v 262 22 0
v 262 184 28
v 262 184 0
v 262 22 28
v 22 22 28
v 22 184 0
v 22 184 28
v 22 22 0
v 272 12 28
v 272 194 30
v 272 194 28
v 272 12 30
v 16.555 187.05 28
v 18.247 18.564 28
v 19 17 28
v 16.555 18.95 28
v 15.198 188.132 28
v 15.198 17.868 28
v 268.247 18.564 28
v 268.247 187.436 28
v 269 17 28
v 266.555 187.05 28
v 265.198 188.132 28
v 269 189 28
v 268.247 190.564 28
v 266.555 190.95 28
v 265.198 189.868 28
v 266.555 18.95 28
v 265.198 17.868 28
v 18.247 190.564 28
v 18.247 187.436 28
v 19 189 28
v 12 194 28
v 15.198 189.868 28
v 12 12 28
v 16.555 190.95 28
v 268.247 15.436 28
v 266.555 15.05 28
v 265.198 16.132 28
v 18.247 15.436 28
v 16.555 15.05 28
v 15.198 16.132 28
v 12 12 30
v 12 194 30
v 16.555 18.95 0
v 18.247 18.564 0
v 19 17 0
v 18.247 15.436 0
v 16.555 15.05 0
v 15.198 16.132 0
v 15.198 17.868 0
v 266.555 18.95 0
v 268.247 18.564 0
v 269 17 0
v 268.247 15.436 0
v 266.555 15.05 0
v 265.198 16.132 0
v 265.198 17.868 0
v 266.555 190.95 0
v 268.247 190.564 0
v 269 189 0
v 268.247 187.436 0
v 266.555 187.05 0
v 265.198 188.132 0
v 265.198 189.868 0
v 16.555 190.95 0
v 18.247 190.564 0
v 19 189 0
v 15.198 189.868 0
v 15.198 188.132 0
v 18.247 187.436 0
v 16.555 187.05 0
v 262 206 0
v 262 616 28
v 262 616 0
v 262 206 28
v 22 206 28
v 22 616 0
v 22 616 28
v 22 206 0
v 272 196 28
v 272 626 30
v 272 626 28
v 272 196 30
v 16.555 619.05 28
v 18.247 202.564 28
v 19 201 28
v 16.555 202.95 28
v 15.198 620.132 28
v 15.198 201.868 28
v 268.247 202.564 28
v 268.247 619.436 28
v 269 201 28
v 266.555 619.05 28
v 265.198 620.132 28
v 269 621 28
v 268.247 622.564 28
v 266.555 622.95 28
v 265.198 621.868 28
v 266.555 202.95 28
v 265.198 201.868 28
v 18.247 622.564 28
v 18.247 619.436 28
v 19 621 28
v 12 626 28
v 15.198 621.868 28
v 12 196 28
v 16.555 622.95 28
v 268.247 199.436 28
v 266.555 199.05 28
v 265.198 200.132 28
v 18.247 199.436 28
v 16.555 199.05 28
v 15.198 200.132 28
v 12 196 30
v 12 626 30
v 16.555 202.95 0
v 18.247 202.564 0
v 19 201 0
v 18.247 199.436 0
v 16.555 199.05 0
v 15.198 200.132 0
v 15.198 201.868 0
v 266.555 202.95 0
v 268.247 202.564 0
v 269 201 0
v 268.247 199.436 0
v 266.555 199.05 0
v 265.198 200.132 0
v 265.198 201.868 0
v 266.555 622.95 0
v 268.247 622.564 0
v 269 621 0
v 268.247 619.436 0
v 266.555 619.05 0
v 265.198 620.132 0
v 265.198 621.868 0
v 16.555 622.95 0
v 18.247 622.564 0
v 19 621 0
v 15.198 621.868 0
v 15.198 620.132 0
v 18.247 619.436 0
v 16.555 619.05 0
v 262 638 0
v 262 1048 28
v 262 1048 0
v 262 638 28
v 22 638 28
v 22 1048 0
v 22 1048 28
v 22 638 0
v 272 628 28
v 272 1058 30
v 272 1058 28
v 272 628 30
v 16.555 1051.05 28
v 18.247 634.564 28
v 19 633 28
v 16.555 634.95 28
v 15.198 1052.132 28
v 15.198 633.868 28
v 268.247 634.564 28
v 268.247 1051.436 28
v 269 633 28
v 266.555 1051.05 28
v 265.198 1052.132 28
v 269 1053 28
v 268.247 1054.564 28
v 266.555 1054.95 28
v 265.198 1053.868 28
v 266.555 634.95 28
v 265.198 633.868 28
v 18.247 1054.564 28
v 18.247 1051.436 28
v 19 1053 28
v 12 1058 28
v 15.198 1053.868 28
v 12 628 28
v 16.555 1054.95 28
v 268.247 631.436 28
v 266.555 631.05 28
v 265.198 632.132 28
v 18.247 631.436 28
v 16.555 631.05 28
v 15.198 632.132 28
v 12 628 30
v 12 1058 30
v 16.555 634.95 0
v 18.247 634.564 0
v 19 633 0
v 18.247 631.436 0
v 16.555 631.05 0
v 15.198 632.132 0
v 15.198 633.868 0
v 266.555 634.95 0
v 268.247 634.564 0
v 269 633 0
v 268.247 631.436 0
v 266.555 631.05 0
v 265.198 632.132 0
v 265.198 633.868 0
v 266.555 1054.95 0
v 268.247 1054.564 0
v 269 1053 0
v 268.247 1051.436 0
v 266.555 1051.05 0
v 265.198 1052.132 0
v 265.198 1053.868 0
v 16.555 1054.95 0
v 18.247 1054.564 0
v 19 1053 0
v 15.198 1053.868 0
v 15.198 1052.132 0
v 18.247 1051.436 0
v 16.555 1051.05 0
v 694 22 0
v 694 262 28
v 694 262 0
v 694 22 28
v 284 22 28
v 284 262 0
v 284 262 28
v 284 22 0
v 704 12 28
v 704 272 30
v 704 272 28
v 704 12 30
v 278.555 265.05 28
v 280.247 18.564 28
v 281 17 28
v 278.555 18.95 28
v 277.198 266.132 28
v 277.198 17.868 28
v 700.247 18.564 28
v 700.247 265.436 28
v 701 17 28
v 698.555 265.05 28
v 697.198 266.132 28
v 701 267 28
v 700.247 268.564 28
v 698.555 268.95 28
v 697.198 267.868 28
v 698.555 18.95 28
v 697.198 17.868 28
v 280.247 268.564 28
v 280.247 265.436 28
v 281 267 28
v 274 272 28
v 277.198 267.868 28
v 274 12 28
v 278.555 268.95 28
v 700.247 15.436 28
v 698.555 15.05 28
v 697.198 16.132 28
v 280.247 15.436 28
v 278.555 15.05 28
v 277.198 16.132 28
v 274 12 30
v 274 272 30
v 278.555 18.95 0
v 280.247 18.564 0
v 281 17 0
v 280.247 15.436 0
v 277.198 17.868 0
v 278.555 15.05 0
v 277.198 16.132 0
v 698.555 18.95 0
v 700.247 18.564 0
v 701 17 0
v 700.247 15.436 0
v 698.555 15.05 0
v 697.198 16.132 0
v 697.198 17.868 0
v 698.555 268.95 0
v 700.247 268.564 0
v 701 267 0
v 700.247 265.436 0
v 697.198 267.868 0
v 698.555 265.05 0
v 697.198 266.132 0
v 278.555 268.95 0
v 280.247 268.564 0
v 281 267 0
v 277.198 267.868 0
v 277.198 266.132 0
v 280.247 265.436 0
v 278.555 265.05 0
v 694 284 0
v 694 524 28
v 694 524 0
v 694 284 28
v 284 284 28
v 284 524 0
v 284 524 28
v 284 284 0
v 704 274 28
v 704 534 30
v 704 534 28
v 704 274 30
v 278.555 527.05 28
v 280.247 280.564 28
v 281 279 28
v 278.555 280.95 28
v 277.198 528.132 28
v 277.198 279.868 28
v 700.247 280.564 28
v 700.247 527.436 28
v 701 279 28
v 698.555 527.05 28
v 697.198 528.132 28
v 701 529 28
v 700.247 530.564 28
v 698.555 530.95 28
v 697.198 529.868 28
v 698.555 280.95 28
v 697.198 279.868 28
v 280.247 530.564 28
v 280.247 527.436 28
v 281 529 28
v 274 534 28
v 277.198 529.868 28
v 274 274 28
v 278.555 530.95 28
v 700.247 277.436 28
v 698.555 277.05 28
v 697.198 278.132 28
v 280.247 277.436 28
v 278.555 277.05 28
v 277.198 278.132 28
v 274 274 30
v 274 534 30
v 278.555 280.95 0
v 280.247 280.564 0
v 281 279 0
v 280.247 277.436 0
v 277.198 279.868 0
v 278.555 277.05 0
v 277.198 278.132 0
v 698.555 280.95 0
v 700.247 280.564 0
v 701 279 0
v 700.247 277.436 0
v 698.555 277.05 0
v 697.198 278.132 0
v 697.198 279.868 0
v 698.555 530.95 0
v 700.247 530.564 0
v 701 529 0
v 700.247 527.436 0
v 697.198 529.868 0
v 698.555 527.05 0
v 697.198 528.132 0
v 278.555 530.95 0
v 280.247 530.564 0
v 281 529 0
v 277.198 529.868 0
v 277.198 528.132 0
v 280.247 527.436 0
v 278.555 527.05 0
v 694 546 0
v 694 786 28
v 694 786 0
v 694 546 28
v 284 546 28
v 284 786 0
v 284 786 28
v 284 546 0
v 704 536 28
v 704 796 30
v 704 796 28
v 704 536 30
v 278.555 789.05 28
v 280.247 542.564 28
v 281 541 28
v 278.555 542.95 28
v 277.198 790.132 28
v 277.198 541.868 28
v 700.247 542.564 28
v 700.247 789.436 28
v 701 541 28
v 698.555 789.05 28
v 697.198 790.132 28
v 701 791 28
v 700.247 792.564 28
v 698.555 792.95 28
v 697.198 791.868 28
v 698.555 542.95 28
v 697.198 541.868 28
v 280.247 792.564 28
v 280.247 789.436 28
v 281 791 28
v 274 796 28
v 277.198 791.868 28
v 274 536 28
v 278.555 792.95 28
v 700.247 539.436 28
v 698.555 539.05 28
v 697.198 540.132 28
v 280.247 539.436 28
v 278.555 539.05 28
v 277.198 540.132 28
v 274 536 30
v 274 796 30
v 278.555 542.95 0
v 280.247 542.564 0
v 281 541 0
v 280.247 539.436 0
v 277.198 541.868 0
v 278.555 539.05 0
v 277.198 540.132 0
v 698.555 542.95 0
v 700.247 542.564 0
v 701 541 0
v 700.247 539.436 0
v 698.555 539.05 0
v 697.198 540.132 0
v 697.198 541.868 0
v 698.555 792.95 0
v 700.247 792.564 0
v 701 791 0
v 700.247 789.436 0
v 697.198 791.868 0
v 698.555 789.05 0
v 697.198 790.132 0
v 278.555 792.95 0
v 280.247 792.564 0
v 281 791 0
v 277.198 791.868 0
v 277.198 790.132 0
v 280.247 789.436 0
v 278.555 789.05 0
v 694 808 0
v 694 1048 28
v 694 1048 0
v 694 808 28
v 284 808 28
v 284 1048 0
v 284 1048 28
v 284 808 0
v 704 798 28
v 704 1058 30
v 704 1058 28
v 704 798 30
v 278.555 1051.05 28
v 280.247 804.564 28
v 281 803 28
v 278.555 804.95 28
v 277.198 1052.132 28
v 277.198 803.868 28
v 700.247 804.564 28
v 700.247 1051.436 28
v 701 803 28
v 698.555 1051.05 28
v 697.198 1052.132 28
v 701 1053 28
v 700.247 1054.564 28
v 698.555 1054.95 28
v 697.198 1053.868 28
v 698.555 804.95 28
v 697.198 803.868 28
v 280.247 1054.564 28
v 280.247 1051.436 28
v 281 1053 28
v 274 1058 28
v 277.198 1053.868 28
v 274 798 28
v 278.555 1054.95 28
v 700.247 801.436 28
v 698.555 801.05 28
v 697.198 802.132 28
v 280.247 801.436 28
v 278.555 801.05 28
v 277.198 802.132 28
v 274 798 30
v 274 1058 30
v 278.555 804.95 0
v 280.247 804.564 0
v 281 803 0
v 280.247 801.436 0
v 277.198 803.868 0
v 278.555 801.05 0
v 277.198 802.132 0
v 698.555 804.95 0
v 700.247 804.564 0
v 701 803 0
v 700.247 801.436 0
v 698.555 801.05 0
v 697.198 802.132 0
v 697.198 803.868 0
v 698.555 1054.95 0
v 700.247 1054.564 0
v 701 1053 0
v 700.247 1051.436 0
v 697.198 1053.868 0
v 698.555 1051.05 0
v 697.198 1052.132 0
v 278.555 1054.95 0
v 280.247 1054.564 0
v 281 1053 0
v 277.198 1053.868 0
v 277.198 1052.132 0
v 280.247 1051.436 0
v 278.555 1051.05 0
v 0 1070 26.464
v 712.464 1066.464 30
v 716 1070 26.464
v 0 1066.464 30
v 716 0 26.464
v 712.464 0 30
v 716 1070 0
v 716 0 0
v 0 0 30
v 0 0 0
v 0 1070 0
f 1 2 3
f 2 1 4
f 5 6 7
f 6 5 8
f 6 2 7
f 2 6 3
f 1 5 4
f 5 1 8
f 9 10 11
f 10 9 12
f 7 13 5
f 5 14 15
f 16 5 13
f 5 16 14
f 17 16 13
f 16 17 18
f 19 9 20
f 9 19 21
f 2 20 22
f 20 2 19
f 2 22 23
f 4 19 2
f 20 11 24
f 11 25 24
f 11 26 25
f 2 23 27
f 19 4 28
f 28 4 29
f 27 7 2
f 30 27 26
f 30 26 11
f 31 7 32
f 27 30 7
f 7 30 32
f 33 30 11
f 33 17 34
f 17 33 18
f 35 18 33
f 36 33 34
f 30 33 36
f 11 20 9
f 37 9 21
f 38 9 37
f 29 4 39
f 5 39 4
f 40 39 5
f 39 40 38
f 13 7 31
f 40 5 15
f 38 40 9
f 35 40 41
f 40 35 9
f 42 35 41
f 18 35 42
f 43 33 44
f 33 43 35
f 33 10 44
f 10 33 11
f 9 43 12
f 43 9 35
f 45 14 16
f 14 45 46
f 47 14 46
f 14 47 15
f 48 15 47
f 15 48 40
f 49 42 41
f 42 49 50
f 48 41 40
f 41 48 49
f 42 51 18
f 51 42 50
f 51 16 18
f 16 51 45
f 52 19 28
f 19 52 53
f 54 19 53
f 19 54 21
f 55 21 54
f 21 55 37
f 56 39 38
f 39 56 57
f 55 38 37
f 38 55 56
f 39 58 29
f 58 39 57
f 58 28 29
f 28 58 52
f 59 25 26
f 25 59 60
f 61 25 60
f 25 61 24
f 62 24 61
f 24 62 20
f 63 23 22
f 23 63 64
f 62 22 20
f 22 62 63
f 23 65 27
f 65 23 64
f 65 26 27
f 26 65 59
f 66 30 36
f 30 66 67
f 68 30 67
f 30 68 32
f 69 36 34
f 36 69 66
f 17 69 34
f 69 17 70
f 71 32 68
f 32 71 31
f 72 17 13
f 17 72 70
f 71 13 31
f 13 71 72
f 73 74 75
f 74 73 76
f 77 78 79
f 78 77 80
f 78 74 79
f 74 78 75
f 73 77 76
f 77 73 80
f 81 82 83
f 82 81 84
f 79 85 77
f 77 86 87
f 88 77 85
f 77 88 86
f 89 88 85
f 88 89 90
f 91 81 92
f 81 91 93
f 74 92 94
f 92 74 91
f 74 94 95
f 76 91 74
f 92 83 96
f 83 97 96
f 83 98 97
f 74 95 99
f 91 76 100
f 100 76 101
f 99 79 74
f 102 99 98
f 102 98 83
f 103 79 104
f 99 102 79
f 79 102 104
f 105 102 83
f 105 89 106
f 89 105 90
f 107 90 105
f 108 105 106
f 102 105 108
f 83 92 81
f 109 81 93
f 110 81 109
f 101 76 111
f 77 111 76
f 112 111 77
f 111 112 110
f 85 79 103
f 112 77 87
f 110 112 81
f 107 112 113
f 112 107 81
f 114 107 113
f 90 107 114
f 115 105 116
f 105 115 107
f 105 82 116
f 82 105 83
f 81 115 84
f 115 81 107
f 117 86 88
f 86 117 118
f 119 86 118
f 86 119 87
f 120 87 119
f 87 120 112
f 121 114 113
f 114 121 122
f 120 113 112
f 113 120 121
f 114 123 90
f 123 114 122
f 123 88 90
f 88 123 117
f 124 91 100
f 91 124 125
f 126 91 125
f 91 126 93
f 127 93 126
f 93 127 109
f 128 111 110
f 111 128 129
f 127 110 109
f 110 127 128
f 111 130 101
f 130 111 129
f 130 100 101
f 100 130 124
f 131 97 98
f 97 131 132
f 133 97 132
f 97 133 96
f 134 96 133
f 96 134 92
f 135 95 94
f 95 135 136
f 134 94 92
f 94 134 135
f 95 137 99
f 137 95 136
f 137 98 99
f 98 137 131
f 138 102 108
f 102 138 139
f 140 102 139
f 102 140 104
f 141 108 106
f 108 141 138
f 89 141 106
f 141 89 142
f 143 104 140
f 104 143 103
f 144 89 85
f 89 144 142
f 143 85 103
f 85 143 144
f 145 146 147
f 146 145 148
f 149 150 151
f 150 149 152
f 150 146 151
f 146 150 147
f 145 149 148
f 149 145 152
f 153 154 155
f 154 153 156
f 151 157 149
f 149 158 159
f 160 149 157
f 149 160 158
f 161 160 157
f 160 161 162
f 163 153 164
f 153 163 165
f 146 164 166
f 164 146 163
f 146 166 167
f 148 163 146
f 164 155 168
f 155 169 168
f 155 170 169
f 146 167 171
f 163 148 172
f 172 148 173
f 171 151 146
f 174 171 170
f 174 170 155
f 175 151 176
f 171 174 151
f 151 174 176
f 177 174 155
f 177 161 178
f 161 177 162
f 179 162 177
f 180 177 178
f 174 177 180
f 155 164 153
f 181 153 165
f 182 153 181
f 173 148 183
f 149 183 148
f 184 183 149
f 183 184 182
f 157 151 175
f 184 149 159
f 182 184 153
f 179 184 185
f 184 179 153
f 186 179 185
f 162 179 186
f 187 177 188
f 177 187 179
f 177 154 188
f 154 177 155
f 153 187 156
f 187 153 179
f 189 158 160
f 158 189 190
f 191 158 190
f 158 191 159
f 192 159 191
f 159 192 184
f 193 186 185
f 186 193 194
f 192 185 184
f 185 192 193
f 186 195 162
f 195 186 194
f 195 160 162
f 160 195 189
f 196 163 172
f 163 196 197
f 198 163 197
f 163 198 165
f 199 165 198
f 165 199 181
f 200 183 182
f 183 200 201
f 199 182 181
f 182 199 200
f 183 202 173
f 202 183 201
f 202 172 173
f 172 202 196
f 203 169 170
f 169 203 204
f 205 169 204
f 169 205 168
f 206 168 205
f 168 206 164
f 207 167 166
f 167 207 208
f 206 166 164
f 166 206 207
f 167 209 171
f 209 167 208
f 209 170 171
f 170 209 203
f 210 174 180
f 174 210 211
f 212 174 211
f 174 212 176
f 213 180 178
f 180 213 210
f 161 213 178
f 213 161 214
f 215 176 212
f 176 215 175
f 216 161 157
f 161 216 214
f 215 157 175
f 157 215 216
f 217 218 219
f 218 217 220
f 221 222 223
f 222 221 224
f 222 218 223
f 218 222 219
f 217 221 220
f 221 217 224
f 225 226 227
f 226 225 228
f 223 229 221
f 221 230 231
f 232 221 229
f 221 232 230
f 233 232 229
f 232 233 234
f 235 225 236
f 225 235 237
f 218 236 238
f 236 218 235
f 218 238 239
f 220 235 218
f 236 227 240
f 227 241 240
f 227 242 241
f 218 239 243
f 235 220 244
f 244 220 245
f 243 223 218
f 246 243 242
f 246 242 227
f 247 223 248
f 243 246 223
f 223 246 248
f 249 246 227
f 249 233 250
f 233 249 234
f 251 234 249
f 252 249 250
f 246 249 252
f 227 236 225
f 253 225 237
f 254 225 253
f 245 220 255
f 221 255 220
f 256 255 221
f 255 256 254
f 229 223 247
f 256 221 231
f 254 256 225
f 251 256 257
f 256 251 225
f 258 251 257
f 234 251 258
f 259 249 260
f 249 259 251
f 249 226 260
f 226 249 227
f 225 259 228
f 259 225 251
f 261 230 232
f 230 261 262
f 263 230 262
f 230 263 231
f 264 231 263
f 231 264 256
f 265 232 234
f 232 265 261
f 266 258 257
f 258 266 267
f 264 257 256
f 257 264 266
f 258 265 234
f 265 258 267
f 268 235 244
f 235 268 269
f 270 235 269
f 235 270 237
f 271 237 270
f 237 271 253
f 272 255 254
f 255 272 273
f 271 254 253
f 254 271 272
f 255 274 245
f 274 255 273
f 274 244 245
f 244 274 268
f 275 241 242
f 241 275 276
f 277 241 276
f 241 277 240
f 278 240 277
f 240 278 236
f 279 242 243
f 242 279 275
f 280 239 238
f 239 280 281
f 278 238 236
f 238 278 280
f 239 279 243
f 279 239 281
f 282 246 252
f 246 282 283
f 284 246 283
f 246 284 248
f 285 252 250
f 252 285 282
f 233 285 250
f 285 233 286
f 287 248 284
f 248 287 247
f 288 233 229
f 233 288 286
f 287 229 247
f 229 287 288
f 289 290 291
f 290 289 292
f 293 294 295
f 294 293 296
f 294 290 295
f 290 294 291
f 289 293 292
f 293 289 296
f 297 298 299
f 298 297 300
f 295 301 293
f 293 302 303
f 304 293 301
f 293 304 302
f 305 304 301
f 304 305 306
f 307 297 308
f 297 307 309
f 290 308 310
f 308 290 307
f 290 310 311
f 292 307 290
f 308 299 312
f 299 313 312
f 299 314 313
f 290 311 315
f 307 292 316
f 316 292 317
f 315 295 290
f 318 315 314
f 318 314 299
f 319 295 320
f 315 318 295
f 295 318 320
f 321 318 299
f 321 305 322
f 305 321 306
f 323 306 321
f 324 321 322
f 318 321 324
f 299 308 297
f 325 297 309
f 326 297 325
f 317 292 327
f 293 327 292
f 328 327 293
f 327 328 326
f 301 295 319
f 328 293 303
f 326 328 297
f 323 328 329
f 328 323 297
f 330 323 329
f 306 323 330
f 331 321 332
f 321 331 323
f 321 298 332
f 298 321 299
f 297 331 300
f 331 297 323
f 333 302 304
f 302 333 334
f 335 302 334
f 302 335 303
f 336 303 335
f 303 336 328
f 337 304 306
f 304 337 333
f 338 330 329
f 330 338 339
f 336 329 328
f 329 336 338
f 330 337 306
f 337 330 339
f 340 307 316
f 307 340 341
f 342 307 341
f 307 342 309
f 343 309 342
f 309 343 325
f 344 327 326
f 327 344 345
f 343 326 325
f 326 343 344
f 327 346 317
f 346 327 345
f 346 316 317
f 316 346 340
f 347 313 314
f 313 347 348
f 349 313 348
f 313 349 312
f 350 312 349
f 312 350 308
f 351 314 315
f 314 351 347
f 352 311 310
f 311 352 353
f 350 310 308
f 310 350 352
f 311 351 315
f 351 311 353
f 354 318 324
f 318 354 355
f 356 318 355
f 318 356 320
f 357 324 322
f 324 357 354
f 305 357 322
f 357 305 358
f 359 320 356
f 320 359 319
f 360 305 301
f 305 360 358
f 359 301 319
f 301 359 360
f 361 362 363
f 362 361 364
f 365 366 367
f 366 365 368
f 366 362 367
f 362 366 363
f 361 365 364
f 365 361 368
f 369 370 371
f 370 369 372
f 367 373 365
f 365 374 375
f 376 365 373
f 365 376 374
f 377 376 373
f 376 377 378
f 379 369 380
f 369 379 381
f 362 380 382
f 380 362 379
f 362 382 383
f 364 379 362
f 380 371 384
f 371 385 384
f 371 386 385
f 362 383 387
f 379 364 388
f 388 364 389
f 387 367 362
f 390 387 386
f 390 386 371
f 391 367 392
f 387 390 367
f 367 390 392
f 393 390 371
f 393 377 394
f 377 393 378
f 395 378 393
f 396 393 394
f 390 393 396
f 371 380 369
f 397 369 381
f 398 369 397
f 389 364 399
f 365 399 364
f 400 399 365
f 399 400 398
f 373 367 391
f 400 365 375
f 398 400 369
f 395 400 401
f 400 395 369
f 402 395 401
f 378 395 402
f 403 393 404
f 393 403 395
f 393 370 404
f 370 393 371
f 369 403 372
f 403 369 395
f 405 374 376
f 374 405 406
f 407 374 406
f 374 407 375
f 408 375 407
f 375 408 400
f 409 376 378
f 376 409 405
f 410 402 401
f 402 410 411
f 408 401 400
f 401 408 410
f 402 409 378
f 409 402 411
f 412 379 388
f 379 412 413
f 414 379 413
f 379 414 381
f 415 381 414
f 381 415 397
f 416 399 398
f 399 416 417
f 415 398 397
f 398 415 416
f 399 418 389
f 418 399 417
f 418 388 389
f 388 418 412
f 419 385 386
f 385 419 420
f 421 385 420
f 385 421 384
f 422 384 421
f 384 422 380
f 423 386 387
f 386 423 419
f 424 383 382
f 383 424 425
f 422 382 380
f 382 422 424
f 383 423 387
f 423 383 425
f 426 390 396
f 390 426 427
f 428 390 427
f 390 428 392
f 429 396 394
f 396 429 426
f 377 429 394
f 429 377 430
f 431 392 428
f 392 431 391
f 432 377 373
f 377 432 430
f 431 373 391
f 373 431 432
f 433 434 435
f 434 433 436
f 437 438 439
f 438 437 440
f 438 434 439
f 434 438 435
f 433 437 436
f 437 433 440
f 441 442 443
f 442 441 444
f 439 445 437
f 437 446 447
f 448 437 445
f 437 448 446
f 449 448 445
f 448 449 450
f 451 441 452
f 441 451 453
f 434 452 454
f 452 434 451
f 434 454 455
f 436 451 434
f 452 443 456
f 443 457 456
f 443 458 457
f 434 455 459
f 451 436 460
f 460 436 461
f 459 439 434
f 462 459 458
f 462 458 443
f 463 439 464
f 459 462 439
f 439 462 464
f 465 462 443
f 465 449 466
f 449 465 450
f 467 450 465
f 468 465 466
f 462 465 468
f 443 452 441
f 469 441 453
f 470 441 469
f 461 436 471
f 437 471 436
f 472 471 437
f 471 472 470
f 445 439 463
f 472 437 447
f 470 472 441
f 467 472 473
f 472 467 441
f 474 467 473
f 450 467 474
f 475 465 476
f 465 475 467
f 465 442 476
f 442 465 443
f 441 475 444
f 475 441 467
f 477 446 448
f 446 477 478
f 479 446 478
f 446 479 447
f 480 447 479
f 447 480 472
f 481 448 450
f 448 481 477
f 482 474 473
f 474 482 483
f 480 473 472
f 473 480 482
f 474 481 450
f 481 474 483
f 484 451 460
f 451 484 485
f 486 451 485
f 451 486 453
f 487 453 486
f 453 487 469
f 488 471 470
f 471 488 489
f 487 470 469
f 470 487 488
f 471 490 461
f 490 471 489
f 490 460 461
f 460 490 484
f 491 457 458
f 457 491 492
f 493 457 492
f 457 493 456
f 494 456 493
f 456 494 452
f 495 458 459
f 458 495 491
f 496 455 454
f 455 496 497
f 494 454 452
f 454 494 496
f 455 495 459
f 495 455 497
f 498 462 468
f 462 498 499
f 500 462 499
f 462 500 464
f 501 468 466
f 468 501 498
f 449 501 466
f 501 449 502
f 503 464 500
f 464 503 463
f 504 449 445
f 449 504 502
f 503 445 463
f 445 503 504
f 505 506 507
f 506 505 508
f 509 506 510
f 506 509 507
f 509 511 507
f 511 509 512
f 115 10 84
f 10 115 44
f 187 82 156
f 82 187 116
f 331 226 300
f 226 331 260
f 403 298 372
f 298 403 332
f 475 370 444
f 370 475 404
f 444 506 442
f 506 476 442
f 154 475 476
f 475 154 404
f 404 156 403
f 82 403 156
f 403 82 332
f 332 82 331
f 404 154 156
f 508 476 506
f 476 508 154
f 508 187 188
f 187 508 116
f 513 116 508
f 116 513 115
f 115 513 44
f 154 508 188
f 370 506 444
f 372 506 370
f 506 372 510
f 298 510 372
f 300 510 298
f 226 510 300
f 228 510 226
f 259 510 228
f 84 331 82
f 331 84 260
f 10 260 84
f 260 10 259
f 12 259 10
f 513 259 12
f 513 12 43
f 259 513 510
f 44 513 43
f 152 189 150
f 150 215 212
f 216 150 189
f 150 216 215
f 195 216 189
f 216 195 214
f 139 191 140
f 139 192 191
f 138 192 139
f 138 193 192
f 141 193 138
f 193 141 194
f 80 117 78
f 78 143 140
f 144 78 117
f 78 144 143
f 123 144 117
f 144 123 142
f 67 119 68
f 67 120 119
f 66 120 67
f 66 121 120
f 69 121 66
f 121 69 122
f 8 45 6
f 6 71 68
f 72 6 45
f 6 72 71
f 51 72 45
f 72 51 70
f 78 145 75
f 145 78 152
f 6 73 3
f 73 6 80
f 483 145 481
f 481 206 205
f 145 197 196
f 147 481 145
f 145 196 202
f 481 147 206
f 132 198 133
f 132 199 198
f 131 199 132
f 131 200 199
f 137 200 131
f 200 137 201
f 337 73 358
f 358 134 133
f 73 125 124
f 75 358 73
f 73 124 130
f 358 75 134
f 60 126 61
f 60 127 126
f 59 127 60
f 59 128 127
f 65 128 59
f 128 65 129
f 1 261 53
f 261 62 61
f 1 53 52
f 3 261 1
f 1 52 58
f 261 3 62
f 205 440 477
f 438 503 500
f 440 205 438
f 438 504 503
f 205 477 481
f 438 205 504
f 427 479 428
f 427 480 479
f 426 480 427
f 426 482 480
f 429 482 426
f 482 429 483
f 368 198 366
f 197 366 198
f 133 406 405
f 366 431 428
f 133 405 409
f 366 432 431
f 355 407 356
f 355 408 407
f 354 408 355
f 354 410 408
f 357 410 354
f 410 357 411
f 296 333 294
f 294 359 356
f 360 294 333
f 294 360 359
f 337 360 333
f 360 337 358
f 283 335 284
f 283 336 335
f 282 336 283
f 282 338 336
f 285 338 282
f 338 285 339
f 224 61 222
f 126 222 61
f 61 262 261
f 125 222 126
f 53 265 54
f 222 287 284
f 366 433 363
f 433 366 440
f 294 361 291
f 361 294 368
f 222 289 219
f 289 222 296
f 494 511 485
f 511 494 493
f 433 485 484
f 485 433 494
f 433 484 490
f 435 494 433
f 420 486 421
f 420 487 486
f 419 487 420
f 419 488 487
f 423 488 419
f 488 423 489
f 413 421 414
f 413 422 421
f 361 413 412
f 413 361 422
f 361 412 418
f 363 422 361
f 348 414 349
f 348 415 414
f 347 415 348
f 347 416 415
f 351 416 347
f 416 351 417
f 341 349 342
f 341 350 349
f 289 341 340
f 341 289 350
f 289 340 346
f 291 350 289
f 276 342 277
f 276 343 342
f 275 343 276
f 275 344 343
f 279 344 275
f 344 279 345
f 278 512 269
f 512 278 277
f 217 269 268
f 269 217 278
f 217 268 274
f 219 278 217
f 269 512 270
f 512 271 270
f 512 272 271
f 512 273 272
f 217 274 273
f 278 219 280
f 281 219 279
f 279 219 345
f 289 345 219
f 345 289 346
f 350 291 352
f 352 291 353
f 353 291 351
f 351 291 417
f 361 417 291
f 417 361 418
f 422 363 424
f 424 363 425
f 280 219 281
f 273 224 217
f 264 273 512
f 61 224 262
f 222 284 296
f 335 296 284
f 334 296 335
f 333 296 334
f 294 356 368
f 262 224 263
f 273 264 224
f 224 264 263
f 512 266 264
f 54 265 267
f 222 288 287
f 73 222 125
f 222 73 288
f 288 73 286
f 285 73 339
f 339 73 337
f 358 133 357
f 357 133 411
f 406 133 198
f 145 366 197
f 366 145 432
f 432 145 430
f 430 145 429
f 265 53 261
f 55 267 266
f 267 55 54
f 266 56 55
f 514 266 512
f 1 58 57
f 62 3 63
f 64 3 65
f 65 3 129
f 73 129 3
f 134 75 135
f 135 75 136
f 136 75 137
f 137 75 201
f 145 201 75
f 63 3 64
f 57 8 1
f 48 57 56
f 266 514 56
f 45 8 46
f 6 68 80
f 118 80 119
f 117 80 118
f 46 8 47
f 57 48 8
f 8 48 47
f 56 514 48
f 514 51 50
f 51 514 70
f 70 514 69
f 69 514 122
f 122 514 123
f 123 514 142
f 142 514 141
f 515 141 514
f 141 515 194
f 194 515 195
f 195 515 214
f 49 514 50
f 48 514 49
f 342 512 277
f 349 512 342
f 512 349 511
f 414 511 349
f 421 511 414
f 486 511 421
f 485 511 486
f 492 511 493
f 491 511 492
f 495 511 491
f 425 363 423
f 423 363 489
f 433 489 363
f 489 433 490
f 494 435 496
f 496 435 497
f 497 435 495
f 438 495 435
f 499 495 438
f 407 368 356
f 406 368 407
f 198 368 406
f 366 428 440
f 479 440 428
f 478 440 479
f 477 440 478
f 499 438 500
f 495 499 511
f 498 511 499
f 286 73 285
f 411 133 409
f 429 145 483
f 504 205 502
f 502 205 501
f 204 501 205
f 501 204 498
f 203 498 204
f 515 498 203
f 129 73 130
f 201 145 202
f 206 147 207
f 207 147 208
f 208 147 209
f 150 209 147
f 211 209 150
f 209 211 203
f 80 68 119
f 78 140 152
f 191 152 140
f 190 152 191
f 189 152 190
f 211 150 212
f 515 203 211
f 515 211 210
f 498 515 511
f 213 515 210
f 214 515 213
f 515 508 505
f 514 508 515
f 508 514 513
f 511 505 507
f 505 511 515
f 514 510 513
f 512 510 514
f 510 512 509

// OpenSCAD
//$fn=32;

D=30;
W=260+430+22+4;//720;
H=6+20+4*260+4;//1090;
N=4;
SPACE=10;
SPACE1=12;
HOLE_R=2;
INLET=2;
DS=2;
WW=22;

// A < B

A= ( H - 2 * SPACE1 - (N-1)*DS ) / N;
B= W - 2*SPACE1 - DS - A;
B1= H - 2 * SPACE1 -2*DS - 2*B;
echo("W=",W);
echo("H=",H);
echo("A=",A);
echo("B=",B);
echo("B1=",B1);


module section(w,h){
    translate([w/2,h/2,0]) {
        cube([w-2*SPACE,h-2*SPACE,3*D],true);
        translate([0,0,D])
        cube([w,h,2*INLET],true);
    }
    translate([SPACE/2,SPACE/2,0]) {
        cylinder(h=3*D,r1=HOLE_R,r2=HOLE_R,center=true);
        translate([w-SPACE,0,0]) 
        cylinder(h=3*D,r1=HOLE_R,r2=HOLE_R,center=true);
        translate([w-SPACE,h-SPACE,0]) 
        cylinder(h=3*D,r1=HOLE_R,r2=HOLE_R,center=true);
        translate([0,h-SPACE,0]) 
        cylinder(h=3*D,r1=HOLE_R,r2=HOLE_R,center=true);
    }
};

function prefix(v,i) = (i==0 ? v[i] : v[i] + prefix(v,i-1,s));

difference(){
    cube([W,H,D]);
    // L 
    dLY=[B1,B,B];
    for(i=[0:len(dLY)-1]) {
        y=prefix(dLY,i)+SPACE1+i*DS-dLY[i];
        dy=dLY[i];
        echo(y+SPACE-WW,y+dy-SPACE-WW,"i=",i," y=",y," dy=",dy);
        translate([SPACE1,y,0])
            section(A,dy);
    }
    dRY=[A,A,A,A];
    for(i=[0:len(dRY)-1]) {
        y=prefix(dRY,i)+SPACE1+i*DS-dRY[i];
        dy=dRY[i];
        echo(y+SPACE-WW,y+dy-SPACE-WW,"i=",i," y=",y," dy=",dy);
        translate([SPACE1+A+DS,y,0])
            section(B,dy);
    }
    // trim edge
    translate([W,H,D]){
        rotate(-45,[1,0,0]){
        cube([3*W,D,5,],center=true);
        }
        rotate(-45,[0,1,0]){
        cube([5,3*W,D],center=true);
        }
    }
}
/*
module holder(){
    difference(){
        box[HSIZE
    }
}
*/
